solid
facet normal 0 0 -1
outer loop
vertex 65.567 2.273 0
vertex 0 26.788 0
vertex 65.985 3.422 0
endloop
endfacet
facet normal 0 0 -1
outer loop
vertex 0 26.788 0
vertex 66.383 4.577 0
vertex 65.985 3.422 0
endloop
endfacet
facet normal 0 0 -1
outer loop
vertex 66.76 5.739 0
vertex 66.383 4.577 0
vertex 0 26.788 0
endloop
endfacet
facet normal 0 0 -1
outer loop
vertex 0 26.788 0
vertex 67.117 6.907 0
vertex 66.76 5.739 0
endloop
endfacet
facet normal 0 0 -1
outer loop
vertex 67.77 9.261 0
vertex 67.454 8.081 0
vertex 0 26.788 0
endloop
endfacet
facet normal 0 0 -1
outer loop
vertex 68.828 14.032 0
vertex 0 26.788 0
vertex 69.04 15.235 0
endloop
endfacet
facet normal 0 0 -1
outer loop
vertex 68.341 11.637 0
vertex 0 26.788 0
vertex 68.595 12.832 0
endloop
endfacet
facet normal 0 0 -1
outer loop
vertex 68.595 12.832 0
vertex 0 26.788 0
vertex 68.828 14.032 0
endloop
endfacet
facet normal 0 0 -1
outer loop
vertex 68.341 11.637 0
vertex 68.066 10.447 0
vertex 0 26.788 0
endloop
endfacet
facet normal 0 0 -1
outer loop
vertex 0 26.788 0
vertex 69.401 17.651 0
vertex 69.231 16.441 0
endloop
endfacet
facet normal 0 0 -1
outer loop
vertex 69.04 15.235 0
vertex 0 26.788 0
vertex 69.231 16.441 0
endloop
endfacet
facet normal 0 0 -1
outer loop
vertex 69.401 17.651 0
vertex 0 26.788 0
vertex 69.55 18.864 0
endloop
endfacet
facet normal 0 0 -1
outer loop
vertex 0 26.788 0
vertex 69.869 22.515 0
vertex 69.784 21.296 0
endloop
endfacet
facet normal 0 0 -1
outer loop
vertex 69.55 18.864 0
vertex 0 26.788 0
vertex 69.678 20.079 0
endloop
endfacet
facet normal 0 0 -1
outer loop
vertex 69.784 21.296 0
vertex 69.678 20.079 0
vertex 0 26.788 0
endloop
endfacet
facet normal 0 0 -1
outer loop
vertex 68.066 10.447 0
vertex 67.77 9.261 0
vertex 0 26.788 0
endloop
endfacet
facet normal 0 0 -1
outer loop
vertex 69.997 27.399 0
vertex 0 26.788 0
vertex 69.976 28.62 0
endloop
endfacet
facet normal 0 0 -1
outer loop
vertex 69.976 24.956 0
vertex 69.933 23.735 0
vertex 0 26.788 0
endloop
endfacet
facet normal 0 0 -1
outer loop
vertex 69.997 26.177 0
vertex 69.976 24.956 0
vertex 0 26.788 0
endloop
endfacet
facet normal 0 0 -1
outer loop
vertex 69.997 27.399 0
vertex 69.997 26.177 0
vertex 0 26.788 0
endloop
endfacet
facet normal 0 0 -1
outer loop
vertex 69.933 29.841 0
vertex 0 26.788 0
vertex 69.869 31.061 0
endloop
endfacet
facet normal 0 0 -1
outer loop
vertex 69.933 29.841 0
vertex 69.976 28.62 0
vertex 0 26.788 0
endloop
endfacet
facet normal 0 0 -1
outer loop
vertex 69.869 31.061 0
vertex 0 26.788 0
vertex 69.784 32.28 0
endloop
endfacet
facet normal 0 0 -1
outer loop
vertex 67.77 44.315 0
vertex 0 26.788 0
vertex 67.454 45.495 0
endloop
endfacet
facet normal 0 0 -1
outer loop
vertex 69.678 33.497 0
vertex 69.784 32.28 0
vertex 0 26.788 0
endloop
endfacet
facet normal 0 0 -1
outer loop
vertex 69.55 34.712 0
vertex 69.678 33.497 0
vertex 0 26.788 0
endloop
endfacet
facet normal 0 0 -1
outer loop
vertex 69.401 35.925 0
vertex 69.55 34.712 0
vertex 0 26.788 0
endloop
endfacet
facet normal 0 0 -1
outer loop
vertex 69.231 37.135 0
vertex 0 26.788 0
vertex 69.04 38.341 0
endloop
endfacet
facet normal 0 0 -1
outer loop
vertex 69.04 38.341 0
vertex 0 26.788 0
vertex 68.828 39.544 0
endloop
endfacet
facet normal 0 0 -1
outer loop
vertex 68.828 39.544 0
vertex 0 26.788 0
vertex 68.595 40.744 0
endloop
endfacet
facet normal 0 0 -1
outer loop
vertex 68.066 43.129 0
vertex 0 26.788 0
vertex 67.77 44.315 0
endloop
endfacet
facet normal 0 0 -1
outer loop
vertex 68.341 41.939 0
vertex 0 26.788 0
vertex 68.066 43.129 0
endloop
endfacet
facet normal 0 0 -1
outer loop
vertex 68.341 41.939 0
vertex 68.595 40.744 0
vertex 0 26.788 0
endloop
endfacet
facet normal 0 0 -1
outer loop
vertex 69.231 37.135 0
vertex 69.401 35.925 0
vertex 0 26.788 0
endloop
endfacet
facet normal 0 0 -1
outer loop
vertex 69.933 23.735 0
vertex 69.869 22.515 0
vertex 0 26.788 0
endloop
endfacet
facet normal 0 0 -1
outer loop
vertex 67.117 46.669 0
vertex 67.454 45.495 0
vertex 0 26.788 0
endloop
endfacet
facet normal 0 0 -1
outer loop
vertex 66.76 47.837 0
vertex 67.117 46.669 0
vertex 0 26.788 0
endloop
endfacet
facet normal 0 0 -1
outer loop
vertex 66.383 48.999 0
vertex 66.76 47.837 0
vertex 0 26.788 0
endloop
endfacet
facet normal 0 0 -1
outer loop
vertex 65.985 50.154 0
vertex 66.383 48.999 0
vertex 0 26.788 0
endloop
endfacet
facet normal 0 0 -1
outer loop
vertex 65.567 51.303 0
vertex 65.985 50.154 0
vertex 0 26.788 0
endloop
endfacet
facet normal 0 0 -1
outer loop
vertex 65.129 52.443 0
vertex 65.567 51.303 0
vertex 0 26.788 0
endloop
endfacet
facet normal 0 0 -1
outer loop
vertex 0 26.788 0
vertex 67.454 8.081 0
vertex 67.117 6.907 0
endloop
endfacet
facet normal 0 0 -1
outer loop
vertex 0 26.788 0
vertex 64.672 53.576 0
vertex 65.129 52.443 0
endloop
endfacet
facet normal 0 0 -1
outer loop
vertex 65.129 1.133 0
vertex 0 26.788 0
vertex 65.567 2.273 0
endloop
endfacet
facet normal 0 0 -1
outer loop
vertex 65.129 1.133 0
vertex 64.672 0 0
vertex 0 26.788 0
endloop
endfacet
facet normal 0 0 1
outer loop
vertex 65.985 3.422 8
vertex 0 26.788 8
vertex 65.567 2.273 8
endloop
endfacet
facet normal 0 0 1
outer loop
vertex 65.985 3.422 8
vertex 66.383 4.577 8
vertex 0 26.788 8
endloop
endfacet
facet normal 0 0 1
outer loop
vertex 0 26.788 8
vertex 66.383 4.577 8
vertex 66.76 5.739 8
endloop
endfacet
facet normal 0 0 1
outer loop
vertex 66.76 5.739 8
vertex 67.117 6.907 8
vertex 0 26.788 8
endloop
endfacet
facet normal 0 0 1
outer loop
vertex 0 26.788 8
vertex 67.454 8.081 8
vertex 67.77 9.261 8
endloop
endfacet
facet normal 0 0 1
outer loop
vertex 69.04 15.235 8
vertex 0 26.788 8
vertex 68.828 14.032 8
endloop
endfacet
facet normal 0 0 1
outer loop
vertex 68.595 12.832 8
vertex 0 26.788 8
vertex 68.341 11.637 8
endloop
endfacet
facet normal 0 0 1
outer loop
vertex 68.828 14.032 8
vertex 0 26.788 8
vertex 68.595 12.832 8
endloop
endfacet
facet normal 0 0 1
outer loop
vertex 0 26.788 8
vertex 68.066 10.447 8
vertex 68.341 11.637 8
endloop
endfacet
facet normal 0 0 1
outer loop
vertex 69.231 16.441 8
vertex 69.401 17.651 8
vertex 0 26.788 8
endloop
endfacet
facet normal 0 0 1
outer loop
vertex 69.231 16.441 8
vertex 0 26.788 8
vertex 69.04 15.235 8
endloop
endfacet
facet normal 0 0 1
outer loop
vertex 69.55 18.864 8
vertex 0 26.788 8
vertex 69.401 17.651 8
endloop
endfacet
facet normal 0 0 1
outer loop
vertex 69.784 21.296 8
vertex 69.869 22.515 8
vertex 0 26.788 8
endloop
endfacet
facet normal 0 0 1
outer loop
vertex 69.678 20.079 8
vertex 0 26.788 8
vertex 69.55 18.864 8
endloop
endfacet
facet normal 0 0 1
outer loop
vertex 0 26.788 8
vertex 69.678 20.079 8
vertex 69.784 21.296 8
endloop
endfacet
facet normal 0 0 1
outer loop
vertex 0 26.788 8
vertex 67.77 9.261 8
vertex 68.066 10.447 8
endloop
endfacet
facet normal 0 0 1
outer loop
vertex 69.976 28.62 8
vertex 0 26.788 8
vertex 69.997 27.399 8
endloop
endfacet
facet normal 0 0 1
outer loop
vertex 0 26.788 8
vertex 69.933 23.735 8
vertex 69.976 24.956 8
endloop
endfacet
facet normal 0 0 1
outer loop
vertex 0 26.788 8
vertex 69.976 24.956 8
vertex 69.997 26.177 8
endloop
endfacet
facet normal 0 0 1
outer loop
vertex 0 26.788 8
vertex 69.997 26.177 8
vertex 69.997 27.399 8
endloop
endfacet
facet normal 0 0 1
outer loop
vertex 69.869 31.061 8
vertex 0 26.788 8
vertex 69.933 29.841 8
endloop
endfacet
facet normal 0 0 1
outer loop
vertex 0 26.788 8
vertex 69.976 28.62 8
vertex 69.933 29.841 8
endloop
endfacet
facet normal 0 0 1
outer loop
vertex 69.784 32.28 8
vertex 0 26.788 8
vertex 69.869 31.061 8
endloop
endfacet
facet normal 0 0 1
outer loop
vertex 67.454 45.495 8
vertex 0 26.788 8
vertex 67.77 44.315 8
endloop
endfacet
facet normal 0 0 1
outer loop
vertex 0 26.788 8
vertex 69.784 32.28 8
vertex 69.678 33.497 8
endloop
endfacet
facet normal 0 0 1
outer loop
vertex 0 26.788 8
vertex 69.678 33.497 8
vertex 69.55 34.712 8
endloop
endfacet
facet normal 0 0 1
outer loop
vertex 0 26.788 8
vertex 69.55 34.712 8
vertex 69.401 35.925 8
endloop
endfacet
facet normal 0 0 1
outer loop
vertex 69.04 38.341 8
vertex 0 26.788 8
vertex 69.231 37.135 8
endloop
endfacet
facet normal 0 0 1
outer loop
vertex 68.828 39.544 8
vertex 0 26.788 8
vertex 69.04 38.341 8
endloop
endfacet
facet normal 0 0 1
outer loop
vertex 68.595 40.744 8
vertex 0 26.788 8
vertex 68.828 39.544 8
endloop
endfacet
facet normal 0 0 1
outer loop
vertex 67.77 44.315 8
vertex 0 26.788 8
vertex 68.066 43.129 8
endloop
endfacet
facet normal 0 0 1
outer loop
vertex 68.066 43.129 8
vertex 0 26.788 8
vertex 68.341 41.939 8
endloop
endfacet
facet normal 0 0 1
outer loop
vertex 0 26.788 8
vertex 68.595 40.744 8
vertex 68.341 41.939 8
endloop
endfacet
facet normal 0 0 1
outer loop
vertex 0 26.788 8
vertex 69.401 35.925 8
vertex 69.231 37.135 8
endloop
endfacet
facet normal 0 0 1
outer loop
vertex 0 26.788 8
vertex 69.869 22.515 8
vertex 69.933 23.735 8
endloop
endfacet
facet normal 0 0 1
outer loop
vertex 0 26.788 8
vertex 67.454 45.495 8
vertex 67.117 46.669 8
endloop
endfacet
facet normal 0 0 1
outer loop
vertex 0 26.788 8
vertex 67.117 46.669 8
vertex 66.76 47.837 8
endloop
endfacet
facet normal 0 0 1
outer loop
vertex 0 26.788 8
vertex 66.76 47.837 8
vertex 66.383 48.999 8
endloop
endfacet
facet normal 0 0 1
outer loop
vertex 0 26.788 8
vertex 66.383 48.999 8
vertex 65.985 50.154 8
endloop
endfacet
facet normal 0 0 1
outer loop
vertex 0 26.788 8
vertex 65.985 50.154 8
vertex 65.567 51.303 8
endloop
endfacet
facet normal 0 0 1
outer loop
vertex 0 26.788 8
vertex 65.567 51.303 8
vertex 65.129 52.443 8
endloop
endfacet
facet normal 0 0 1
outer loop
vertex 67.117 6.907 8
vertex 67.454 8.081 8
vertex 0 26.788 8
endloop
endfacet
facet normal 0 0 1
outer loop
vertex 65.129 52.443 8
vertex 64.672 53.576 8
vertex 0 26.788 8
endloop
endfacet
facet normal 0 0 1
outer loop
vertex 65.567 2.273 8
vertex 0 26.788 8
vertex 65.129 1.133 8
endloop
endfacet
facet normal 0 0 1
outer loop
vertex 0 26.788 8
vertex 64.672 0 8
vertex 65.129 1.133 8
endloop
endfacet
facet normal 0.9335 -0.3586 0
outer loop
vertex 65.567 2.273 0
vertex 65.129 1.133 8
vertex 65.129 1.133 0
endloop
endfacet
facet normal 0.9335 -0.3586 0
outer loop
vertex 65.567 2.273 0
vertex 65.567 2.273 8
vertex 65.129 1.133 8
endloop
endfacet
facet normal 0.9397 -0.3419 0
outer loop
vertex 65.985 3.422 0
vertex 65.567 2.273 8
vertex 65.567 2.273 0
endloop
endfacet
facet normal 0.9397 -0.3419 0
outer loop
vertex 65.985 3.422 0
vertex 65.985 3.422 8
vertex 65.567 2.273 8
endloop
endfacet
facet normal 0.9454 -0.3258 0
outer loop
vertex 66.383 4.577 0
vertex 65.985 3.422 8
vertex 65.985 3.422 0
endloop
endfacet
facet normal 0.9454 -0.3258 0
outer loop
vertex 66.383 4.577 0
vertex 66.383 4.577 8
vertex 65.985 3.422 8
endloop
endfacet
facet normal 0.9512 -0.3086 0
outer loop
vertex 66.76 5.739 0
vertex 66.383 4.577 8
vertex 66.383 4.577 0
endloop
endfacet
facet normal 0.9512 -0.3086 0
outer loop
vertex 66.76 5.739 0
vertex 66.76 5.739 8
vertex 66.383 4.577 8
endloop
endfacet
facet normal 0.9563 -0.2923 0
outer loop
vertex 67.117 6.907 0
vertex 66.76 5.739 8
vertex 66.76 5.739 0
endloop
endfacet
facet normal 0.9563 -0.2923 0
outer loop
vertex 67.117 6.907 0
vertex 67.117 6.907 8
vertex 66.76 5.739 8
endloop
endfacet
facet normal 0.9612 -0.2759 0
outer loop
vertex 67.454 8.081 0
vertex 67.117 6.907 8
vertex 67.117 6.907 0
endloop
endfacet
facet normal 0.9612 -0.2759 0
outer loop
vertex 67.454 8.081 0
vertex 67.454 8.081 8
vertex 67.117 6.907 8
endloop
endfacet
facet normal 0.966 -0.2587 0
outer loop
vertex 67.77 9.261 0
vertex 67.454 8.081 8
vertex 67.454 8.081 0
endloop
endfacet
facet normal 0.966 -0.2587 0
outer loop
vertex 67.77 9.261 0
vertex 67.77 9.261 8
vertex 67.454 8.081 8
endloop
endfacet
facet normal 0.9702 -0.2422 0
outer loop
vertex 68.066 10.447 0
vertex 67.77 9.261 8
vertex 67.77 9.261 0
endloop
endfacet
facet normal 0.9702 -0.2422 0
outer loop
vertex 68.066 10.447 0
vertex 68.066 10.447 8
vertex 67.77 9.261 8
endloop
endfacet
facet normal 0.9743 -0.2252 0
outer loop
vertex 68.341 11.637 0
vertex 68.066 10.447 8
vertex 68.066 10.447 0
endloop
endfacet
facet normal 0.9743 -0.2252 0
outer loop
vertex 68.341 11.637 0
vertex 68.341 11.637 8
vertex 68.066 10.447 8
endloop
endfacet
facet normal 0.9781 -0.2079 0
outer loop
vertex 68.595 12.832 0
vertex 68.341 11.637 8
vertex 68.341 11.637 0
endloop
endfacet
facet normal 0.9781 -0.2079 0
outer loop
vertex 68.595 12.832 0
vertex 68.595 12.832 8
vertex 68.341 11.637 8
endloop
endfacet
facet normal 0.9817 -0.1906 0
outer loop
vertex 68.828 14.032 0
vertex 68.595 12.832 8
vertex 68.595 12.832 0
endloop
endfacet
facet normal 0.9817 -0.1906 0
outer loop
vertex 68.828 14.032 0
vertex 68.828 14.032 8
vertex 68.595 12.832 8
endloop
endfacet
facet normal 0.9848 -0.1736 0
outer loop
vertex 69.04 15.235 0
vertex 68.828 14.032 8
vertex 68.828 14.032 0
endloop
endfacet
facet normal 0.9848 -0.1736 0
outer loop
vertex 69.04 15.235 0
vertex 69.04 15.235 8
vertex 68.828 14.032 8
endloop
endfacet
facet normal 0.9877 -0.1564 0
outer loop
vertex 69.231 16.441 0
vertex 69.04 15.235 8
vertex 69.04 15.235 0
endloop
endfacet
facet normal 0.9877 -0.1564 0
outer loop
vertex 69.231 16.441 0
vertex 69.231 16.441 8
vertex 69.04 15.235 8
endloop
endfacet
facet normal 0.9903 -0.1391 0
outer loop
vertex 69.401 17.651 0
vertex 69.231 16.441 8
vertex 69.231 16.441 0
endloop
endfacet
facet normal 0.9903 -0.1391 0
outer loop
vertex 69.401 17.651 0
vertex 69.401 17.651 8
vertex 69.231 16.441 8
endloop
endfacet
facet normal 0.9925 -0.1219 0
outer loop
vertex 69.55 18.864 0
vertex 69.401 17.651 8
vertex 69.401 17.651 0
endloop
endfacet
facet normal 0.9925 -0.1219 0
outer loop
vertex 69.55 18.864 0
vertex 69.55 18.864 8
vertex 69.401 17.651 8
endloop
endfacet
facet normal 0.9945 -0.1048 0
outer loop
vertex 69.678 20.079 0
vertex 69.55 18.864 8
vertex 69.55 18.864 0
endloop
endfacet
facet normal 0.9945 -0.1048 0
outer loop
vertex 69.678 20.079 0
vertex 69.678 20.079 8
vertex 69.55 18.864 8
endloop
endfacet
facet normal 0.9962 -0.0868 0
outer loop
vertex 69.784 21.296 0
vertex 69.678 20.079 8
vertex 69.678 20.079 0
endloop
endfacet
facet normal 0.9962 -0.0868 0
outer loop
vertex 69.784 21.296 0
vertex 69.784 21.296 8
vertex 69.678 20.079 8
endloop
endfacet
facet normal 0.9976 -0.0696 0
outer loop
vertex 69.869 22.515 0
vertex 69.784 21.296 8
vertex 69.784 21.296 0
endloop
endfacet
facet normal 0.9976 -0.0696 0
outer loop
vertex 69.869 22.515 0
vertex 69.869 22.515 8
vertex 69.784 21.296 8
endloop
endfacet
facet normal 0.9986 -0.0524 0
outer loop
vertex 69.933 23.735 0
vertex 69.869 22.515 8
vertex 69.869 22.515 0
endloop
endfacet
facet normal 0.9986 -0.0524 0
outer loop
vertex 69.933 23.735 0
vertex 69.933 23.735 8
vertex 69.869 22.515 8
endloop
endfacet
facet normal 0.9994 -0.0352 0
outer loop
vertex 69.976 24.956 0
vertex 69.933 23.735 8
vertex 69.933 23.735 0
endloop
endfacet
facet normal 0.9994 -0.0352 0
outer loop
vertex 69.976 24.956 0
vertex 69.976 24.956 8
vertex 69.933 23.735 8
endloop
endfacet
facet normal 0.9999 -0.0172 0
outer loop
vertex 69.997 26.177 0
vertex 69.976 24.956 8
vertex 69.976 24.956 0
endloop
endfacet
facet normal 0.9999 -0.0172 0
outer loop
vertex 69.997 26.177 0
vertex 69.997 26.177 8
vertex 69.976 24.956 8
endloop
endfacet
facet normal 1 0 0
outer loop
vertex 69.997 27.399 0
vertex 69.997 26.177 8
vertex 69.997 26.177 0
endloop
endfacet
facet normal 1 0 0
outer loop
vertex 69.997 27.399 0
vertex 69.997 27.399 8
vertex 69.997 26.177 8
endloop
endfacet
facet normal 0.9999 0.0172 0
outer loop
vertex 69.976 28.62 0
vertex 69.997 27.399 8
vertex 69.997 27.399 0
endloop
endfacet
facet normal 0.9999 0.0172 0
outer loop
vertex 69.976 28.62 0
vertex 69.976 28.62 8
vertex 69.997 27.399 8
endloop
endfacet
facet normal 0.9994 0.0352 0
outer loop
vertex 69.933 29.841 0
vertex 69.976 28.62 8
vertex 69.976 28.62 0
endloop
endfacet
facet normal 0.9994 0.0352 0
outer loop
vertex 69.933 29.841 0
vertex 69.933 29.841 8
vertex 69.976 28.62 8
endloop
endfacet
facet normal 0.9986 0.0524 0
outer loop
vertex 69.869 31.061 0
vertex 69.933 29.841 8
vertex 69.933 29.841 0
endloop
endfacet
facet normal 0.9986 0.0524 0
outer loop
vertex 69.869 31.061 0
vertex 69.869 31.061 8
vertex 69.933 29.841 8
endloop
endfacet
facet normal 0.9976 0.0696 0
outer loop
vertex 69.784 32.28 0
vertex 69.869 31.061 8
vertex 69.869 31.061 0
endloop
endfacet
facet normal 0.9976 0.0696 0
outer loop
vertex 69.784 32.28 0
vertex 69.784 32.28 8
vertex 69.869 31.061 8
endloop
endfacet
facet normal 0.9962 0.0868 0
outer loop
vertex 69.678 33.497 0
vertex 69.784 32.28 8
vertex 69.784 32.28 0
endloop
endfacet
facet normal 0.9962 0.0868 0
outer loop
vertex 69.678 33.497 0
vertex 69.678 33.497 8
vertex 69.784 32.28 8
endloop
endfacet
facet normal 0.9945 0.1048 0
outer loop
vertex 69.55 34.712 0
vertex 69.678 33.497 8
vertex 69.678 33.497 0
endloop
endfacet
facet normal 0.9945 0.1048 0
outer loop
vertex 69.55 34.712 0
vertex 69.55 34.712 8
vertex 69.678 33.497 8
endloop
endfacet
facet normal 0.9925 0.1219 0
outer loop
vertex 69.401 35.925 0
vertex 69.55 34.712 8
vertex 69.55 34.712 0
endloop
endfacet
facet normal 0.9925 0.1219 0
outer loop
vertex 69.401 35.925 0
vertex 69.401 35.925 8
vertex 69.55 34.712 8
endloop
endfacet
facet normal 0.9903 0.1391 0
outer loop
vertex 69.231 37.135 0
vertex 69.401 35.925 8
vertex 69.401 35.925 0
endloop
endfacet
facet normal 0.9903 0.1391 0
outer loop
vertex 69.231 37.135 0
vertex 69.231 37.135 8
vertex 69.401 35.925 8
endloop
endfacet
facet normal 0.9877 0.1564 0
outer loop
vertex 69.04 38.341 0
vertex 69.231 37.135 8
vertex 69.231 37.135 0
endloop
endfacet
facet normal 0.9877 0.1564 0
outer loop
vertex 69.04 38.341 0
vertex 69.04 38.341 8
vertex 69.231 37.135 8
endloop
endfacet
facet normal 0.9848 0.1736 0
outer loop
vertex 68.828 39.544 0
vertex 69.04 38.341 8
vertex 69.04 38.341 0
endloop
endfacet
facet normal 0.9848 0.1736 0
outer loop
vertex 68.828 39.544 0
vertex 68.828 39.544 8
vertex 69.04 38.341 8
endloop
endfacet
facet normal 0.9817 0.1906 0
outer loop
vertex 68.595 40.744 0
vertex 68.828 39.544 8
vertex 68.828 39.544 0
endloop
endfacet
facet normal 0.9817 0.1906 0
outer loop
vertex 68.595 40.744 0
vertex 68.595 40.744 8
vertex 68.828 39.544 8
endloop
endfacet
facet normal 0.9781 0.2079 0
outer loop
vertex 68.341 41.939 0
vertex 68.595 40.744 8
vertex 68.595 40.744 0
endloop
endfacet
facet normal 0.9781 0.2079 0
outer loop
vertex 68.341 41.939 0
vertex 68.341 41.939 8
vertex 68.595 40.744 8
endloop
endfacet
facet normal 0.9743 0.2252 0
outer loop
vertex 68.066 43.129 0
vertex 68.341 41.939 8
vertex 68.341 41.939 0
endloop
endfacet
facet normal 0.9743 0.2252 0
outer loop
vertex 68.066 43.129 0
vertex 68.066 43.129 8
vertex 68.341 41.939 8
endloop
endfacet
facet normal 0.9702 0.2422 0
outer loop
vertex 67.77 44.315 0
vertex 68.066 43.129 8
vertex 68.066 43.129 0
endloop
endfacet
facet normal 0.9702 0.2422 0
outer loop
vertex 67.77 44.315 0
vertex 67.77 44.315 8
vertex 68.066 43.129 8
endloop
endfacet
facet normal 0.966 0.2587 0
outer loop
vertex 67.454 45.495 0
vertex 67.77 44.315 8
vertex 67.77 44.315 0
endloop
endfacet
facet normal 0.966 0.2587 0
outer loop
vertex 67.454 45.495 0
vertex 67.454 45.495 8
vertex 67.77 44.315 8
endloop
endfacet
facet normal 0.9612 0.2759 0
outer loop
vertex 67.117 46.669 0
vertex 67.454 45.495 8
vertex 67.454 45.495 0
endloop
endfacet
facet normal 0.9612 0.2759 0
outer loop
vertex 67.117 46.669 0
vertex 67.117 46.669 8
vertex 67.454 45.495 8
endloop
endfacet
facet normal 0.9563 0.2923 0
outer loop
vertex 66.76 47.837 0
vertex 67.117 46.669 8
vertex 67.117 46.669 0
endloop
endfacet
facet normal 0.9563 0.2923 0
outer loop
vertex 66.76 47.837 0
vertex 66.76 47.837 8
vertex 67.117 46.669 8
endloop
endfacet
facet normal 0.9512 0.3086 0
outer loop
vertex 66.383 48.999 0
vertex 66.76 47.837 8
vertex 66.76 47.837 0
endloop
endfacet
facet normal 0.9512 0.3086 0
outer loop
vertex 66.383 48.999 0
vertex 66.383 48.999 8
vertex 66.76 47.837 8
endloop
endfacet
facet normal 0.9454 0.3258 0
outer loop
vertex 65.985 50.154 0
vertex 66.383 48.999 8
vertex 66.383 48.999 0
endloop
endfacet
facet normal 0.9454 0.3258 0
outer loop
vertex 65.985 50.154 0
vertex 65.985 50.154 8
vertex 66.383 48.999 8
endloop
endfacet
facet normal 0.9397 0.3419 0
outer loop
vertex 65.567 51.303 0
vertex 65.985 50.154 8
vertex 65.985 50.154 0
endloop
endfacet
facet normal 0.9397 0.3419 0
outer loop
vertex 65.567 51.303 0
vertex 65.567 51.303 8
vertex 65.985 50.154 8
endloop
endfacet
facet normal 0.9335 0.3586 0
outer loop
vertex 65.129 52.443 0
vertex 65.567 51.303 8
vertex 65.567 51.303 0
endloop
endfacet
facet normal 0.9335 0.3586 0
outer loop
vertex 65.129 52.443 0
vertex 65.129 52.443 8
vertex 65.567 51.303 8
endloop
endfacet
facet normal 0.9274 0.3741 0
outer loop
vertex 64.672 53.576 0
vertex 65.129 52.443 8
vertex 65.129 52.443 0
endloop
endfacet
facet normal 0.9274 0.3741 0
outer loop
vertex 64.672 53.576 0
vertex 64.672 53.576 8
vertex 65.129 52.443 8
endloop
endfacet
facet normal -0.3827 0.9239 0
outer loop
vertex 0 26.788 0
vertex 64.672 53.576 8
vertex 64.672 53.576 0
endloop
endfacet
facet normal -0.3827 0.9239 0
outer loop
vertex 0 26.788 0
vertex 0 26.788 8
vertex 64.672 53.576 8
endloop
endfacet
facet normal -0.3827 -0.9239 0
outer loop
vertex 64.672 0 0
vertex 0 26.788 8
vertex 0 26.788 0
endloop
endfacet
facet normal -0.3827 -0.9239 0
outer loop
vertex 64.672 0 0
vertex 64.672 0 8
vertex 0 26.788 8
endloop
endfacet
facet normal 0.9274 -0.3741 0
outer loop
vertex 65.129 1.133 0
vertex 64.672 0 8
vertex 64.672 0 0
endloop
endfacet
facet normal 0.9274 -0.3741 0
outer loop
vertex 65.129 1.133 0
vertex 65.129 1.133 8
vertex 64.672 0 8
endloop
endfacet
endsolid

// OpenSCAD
$fn = 32;

// ----------------------------------------------------------------------
// Arc profile plate: sector, 47 points
// ----------------------------------------------------------------------

// --- parameters (mm) ---
sector_angle = 45;        // sector angle, degrees
sector_r = 70;            // outer radius
arc_step = 1;             // sampling step of the arc, degrees
plate_t = 8;              // plate thickness, Z
fit_tol = 0.02;           // declared fit tolerance (prompt contract)
free_tol = 0.2;           // declared free tolerance (prompt contract)

bbox_x = 2 * sector_r * sin(sector_angle / 2);  // chord of the sector
bbox_y = sector_r;  // depth of the sector (apex to arc)

profile = [[64.672, 0], [65.129, 1.133], [65.567, 2.273], [65.985, 3.422], [66.383, 4.577], [66.76, 5.739], [67.117, 6.907], [67.454, 8.081], [67.77, 9.261], [68.066, 10.447], [68.341, 11.637], [68.595, 12.832], [68.828, 14.032], [69.04, 15.235], [69.231, 16.441], [69.401, 17.651], [69.55, 18.864], [69.678, 20.079], [69.784, 21.296], [69.869, 22.515], [69.933, 23.735], [69.976, 24.956], [69.997, 26.177], [69.997, 27.399], [69.976, 28.62], [69.933, 29.841], [69.869, 31.061], [69.784, 32.28], [69.678, 33.497], [69.55, 34.712], [69.401, 35.925], [69.231, 37.135], [69.04, 38.341], [68.828, 39.544], [68.595, 40.744], [68.341, 41.939], [68.066, 43.129], [67.77, 44.315], [67.454, 45.495], [67.117, 46.669], [66.76, 47.837], [66.383, 48.999], [65.985, 50.154], [65.567, 51.303], [65.129, 52.443], [64.672, 53.576], [0, 26.788]];  // primary outline, 47 points, counter clockwise

// --- the one profile operation ---
linear_extrude(height = plate_t) polygon(points = profile);
